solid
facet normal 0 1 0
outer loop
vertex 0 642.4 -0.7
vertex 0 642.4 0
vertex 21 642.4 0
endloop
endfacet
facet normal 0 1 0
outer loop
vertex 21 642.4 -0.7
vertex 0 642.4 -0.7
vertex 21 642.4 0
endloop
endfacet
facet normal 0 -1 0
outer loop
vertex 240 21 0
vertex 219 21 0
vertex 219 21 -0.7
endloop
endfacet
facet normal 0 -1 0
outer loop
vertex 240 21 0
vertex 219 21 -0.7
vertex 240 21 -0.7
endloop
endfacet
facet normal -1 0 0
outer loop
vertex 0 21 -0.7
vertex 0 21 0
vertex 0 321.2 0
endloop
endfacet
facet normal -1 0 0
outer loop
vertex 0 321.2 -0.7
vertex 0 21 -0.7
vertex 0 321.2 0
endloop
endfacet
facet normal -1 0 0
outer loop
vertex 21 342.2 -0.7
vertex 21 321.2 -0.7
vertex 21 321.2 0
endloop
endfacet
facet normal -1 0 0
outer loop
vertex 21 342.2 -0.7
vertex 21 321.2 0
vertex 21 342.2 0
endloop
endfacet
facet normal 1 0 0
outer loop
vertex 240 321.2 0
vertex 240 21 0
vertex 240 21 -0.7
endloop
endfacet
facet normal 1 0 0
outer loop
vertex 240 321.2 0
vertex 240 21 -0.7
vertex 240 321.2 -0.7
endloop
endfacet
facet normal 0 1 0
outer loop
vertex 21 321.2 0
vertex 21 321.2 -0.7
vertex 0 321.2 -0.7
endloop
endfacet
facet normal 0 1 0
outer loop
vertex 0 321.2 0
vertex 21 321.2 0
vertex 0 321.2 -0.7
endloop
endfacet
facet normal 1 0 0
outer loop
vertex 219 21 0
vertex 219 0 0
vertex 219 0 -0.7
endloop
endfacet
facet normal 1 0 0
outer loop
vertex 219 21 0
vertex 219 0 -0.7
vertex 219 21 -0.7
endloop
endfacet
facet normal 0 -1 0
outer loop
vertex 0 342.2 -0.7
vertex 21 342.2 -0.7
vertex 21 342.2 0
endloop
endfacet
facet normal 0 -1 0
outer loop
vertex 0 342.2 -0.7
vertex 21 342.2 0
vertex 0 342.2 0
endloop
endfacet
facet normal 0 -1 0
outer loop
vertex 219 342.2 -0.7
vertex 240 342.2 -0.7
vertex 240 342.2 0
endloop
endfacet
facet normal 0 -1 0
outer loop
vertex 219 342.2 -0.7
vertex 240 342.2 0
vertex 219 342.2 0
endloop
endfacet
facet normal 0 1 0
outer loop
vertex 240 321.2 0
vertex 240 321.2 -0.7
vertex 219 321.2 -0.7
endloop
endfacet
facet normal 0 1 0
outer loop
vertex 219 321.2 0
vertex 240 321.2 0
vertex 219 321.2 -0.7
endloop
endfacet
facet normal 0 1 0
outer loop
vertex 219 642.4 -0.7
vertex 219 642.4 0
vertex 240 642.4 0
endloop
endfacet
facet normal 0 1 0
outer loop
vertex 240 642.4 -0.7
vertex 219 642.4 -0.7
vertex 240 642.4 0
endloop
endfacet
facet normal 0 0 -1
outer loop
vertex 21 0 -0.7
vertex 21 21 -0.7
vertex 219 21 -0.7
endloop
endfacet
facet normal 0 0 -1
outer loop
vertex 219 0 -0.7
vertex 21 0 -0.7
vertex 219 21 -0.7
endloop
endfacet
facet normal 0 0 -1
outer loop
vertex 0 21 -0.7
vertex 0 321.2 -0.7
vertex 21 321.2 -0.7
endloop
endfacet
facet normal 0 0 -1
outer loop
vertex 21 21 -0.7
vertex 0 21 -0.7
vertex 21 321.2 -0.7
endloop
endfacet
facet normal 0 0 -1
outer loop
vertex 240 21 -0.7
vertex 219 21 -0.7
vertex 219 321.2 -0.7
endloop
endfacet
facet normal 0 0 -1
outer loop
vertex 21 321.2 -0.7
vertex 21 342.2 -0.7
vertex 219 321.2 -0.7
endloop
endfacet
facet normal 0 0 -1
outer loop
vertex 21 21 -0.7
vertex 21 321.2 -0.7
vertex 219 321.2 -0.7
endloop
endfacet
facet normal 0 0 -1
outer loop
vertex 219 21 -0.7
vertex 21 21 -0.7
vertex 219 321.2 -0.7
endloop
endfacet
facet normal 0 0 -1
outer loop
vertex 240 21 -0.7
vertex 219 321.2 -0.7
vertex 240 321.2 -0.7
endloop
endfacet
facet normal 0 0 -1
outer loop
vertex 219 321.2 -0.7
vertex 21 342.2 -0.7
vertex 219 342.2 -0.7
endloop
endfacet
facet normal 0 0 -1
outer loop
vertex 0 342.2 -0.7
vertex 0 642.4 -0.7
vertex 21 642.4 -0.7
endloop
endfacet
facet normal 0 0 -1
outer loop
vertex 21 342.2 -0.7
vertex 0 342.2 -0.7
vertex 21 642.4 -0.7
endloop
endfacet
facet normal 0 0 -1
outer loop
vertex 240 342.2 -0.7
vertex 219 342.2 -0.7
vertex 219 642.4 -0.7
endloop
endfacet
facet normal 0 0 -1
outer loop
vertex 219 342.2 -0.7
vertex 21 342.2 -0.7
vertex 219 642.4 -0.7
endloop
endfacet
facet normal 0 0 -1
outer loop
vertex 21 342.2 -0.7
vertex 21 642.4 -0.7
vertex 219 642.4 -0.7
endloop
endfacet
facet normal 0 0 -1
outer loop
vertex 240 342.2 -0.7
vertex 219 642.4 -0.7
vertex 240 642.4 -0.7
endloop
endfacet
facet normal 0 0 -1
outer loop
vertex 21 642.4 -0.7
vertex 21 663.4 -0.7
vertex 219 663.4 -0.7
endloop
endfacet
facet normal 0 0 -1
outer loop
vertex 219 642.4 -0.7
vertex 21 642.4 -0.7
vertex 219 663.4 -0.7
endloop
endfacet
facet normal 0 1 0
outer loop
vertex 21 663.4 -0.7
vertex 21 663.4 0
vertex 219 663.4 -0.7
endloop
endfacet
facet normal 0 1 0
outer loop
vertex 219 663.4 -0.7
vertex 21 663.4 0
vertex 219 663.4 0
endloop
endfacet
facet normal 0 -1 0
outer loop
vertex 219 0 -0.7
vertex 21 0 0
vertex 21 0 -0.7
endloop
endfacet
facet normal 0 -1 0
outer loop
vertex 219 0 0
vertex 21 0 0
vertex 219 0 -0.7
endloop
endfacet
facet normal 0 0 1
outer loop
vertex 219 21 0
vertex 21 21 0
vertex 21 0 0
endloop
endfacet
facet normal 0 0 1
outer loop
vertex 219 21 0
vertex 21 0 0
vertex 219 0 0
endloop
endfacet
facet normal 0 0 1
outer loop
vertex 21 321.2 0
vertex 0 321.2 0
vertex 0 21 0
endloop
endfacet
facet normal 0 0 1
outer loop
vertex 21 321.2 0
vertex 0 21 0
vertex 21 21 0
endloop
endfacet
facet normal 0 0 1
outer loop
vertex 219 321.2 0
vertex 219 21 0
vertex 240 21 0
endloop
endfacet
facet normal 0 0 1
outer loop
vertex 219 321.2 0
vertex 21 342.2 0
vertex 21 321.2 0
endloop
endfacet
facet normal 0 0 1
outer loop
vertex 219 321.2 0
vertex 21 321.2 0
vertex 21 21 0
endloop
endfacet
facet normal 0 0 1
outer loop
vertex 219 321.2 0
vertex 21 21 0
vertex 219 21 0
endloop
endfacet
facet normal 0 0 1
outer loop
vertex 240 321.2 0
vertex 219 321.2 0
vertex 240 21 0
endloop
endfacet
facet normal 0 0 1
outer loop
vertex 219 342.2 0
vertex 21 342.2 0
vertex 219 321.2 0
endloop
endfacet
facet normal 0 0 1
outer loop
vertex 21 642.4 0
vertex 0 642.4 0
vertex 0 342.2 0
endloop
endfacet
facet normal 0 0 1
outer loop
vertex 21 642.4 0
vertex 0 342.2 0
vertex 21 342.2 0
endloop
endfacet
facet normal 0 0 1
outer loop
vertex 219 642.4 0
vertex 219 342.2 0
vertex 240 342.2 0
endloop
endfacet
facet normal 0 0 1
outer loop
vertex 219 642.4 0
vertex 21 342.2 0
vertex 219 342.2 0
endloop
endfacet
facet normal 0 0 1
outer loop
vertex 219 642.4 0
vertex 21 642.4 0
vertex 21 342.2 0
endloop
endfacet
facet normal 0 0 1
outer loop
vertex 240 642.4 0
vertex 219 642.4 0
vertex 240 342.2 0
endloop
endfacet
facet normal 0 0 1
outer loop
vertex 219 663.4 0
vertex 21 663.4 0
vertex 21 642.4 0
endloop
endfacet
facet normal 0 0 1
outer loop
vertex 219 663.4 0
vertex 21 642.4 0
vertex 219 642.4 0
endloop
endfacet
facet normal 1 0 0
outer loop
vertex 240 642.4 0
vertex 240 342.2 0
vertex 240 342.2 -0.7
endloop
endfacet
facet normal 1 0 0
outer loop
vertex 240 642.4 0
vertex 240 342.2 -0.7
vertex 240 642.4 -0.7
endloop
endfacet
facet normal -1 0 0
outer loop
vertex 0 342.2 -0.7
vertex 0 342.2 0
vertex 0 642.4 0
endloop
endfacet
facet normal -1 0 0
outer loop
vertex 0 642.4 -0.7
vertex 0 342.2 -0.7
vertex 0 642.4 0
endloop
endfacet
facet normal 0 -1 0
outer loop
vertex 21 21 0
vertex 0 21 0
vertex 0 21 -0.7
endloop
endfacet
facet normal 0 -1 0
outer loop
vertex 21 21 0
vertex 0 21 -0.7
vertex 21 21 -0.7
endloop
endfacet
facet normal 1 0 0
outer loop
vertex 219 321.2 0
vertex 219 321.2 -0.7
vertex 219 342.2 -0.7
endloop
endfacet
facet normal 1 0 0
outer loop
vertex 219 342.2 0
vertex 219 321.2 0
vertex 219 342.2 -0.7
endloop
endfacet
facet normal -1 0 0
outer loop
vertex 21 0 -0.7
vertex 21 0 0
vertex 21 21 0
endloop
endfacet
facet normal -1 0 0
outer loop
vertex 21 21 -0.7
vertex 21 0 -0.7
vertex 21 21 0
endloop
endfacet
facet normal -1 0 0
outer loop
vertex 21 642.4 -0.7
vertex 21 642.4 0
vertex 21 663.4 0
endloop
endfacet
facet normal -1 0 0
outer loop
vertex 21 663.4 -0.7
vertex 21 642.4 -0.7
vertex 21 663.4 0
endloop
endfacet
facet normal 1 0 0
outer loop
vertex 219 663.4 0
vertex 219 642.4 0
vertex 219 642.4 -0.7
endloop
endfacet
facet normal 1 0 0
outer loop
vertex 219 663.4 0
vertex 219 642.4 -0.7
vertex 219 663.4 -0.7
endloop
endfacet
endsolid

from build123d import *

# Parameters (mm, degrees)
SKETCH1_W          = 240
SKETCH1_H          = 663.4
BASE_FLANGE1_DEPTH = 0.7
SKETCH2_W          = 21
SKETCH2_H          = 21
CUT_EXTRUDE1_DEPTH = 10
SKETCH3_W          = 21
SKETCH3_H          = 21
CUT_EXTRUDE2_DEPTH = 10


# Sheet-metal steps are written as plain solids
with BuildPart() as part:
    # Sketch1 → Base-Flange1 (new body)
    with BuildSketch(Plane.XY):
        with Locations((120, 331.7)):
            Rectangle(SKETCH1_W, SKETCH1_H)
    extrude(amount=-BASE_FLANGE1_DEPTH)

    # Sketch2 → Cut-Extrude1 (cut)
    with BuildSketch(Plane.XY):
        with Locations((229.5, 652.9)):
            Rectangle(SKETCH2_W, SKETCH2_H)
        with Locations((10.5, 652.9)):
            Rectangle(SKETCH2_W, SKETCH2_H)
        with Locations((10.5, 10.5)):
            Rectangle(SKETCH2_W, SKETCH2_H)
        with Locations((229.5, 10.5)):
            Rectangle(SKETCH2_W, SKETCH2_H)
    extrude(amount=-CUT_EXTRUDE1_DEPTH, mode=Mode.SUBTRACT)

    # Sketch3 → Cut-Extrude2 (cut)
    with BuildSketch(Plane(origin=(0, 0, -0.7), x_dir=(-1, 0, 0), z_dir=(0, 0, -1))):
        with Locations((-10.5, 331.7)):
            Rectangle(SKETCH3_W, SKETCH3_H)
        with Locations((-229.5, 331.7)):
            Rectangle(SKETCH3_W, SKETCH3_H)
    extrude(amount=-CUT_EXTRUDE2_DEPTH, mode=Mode.SUBTRACT)


solid = part.part
